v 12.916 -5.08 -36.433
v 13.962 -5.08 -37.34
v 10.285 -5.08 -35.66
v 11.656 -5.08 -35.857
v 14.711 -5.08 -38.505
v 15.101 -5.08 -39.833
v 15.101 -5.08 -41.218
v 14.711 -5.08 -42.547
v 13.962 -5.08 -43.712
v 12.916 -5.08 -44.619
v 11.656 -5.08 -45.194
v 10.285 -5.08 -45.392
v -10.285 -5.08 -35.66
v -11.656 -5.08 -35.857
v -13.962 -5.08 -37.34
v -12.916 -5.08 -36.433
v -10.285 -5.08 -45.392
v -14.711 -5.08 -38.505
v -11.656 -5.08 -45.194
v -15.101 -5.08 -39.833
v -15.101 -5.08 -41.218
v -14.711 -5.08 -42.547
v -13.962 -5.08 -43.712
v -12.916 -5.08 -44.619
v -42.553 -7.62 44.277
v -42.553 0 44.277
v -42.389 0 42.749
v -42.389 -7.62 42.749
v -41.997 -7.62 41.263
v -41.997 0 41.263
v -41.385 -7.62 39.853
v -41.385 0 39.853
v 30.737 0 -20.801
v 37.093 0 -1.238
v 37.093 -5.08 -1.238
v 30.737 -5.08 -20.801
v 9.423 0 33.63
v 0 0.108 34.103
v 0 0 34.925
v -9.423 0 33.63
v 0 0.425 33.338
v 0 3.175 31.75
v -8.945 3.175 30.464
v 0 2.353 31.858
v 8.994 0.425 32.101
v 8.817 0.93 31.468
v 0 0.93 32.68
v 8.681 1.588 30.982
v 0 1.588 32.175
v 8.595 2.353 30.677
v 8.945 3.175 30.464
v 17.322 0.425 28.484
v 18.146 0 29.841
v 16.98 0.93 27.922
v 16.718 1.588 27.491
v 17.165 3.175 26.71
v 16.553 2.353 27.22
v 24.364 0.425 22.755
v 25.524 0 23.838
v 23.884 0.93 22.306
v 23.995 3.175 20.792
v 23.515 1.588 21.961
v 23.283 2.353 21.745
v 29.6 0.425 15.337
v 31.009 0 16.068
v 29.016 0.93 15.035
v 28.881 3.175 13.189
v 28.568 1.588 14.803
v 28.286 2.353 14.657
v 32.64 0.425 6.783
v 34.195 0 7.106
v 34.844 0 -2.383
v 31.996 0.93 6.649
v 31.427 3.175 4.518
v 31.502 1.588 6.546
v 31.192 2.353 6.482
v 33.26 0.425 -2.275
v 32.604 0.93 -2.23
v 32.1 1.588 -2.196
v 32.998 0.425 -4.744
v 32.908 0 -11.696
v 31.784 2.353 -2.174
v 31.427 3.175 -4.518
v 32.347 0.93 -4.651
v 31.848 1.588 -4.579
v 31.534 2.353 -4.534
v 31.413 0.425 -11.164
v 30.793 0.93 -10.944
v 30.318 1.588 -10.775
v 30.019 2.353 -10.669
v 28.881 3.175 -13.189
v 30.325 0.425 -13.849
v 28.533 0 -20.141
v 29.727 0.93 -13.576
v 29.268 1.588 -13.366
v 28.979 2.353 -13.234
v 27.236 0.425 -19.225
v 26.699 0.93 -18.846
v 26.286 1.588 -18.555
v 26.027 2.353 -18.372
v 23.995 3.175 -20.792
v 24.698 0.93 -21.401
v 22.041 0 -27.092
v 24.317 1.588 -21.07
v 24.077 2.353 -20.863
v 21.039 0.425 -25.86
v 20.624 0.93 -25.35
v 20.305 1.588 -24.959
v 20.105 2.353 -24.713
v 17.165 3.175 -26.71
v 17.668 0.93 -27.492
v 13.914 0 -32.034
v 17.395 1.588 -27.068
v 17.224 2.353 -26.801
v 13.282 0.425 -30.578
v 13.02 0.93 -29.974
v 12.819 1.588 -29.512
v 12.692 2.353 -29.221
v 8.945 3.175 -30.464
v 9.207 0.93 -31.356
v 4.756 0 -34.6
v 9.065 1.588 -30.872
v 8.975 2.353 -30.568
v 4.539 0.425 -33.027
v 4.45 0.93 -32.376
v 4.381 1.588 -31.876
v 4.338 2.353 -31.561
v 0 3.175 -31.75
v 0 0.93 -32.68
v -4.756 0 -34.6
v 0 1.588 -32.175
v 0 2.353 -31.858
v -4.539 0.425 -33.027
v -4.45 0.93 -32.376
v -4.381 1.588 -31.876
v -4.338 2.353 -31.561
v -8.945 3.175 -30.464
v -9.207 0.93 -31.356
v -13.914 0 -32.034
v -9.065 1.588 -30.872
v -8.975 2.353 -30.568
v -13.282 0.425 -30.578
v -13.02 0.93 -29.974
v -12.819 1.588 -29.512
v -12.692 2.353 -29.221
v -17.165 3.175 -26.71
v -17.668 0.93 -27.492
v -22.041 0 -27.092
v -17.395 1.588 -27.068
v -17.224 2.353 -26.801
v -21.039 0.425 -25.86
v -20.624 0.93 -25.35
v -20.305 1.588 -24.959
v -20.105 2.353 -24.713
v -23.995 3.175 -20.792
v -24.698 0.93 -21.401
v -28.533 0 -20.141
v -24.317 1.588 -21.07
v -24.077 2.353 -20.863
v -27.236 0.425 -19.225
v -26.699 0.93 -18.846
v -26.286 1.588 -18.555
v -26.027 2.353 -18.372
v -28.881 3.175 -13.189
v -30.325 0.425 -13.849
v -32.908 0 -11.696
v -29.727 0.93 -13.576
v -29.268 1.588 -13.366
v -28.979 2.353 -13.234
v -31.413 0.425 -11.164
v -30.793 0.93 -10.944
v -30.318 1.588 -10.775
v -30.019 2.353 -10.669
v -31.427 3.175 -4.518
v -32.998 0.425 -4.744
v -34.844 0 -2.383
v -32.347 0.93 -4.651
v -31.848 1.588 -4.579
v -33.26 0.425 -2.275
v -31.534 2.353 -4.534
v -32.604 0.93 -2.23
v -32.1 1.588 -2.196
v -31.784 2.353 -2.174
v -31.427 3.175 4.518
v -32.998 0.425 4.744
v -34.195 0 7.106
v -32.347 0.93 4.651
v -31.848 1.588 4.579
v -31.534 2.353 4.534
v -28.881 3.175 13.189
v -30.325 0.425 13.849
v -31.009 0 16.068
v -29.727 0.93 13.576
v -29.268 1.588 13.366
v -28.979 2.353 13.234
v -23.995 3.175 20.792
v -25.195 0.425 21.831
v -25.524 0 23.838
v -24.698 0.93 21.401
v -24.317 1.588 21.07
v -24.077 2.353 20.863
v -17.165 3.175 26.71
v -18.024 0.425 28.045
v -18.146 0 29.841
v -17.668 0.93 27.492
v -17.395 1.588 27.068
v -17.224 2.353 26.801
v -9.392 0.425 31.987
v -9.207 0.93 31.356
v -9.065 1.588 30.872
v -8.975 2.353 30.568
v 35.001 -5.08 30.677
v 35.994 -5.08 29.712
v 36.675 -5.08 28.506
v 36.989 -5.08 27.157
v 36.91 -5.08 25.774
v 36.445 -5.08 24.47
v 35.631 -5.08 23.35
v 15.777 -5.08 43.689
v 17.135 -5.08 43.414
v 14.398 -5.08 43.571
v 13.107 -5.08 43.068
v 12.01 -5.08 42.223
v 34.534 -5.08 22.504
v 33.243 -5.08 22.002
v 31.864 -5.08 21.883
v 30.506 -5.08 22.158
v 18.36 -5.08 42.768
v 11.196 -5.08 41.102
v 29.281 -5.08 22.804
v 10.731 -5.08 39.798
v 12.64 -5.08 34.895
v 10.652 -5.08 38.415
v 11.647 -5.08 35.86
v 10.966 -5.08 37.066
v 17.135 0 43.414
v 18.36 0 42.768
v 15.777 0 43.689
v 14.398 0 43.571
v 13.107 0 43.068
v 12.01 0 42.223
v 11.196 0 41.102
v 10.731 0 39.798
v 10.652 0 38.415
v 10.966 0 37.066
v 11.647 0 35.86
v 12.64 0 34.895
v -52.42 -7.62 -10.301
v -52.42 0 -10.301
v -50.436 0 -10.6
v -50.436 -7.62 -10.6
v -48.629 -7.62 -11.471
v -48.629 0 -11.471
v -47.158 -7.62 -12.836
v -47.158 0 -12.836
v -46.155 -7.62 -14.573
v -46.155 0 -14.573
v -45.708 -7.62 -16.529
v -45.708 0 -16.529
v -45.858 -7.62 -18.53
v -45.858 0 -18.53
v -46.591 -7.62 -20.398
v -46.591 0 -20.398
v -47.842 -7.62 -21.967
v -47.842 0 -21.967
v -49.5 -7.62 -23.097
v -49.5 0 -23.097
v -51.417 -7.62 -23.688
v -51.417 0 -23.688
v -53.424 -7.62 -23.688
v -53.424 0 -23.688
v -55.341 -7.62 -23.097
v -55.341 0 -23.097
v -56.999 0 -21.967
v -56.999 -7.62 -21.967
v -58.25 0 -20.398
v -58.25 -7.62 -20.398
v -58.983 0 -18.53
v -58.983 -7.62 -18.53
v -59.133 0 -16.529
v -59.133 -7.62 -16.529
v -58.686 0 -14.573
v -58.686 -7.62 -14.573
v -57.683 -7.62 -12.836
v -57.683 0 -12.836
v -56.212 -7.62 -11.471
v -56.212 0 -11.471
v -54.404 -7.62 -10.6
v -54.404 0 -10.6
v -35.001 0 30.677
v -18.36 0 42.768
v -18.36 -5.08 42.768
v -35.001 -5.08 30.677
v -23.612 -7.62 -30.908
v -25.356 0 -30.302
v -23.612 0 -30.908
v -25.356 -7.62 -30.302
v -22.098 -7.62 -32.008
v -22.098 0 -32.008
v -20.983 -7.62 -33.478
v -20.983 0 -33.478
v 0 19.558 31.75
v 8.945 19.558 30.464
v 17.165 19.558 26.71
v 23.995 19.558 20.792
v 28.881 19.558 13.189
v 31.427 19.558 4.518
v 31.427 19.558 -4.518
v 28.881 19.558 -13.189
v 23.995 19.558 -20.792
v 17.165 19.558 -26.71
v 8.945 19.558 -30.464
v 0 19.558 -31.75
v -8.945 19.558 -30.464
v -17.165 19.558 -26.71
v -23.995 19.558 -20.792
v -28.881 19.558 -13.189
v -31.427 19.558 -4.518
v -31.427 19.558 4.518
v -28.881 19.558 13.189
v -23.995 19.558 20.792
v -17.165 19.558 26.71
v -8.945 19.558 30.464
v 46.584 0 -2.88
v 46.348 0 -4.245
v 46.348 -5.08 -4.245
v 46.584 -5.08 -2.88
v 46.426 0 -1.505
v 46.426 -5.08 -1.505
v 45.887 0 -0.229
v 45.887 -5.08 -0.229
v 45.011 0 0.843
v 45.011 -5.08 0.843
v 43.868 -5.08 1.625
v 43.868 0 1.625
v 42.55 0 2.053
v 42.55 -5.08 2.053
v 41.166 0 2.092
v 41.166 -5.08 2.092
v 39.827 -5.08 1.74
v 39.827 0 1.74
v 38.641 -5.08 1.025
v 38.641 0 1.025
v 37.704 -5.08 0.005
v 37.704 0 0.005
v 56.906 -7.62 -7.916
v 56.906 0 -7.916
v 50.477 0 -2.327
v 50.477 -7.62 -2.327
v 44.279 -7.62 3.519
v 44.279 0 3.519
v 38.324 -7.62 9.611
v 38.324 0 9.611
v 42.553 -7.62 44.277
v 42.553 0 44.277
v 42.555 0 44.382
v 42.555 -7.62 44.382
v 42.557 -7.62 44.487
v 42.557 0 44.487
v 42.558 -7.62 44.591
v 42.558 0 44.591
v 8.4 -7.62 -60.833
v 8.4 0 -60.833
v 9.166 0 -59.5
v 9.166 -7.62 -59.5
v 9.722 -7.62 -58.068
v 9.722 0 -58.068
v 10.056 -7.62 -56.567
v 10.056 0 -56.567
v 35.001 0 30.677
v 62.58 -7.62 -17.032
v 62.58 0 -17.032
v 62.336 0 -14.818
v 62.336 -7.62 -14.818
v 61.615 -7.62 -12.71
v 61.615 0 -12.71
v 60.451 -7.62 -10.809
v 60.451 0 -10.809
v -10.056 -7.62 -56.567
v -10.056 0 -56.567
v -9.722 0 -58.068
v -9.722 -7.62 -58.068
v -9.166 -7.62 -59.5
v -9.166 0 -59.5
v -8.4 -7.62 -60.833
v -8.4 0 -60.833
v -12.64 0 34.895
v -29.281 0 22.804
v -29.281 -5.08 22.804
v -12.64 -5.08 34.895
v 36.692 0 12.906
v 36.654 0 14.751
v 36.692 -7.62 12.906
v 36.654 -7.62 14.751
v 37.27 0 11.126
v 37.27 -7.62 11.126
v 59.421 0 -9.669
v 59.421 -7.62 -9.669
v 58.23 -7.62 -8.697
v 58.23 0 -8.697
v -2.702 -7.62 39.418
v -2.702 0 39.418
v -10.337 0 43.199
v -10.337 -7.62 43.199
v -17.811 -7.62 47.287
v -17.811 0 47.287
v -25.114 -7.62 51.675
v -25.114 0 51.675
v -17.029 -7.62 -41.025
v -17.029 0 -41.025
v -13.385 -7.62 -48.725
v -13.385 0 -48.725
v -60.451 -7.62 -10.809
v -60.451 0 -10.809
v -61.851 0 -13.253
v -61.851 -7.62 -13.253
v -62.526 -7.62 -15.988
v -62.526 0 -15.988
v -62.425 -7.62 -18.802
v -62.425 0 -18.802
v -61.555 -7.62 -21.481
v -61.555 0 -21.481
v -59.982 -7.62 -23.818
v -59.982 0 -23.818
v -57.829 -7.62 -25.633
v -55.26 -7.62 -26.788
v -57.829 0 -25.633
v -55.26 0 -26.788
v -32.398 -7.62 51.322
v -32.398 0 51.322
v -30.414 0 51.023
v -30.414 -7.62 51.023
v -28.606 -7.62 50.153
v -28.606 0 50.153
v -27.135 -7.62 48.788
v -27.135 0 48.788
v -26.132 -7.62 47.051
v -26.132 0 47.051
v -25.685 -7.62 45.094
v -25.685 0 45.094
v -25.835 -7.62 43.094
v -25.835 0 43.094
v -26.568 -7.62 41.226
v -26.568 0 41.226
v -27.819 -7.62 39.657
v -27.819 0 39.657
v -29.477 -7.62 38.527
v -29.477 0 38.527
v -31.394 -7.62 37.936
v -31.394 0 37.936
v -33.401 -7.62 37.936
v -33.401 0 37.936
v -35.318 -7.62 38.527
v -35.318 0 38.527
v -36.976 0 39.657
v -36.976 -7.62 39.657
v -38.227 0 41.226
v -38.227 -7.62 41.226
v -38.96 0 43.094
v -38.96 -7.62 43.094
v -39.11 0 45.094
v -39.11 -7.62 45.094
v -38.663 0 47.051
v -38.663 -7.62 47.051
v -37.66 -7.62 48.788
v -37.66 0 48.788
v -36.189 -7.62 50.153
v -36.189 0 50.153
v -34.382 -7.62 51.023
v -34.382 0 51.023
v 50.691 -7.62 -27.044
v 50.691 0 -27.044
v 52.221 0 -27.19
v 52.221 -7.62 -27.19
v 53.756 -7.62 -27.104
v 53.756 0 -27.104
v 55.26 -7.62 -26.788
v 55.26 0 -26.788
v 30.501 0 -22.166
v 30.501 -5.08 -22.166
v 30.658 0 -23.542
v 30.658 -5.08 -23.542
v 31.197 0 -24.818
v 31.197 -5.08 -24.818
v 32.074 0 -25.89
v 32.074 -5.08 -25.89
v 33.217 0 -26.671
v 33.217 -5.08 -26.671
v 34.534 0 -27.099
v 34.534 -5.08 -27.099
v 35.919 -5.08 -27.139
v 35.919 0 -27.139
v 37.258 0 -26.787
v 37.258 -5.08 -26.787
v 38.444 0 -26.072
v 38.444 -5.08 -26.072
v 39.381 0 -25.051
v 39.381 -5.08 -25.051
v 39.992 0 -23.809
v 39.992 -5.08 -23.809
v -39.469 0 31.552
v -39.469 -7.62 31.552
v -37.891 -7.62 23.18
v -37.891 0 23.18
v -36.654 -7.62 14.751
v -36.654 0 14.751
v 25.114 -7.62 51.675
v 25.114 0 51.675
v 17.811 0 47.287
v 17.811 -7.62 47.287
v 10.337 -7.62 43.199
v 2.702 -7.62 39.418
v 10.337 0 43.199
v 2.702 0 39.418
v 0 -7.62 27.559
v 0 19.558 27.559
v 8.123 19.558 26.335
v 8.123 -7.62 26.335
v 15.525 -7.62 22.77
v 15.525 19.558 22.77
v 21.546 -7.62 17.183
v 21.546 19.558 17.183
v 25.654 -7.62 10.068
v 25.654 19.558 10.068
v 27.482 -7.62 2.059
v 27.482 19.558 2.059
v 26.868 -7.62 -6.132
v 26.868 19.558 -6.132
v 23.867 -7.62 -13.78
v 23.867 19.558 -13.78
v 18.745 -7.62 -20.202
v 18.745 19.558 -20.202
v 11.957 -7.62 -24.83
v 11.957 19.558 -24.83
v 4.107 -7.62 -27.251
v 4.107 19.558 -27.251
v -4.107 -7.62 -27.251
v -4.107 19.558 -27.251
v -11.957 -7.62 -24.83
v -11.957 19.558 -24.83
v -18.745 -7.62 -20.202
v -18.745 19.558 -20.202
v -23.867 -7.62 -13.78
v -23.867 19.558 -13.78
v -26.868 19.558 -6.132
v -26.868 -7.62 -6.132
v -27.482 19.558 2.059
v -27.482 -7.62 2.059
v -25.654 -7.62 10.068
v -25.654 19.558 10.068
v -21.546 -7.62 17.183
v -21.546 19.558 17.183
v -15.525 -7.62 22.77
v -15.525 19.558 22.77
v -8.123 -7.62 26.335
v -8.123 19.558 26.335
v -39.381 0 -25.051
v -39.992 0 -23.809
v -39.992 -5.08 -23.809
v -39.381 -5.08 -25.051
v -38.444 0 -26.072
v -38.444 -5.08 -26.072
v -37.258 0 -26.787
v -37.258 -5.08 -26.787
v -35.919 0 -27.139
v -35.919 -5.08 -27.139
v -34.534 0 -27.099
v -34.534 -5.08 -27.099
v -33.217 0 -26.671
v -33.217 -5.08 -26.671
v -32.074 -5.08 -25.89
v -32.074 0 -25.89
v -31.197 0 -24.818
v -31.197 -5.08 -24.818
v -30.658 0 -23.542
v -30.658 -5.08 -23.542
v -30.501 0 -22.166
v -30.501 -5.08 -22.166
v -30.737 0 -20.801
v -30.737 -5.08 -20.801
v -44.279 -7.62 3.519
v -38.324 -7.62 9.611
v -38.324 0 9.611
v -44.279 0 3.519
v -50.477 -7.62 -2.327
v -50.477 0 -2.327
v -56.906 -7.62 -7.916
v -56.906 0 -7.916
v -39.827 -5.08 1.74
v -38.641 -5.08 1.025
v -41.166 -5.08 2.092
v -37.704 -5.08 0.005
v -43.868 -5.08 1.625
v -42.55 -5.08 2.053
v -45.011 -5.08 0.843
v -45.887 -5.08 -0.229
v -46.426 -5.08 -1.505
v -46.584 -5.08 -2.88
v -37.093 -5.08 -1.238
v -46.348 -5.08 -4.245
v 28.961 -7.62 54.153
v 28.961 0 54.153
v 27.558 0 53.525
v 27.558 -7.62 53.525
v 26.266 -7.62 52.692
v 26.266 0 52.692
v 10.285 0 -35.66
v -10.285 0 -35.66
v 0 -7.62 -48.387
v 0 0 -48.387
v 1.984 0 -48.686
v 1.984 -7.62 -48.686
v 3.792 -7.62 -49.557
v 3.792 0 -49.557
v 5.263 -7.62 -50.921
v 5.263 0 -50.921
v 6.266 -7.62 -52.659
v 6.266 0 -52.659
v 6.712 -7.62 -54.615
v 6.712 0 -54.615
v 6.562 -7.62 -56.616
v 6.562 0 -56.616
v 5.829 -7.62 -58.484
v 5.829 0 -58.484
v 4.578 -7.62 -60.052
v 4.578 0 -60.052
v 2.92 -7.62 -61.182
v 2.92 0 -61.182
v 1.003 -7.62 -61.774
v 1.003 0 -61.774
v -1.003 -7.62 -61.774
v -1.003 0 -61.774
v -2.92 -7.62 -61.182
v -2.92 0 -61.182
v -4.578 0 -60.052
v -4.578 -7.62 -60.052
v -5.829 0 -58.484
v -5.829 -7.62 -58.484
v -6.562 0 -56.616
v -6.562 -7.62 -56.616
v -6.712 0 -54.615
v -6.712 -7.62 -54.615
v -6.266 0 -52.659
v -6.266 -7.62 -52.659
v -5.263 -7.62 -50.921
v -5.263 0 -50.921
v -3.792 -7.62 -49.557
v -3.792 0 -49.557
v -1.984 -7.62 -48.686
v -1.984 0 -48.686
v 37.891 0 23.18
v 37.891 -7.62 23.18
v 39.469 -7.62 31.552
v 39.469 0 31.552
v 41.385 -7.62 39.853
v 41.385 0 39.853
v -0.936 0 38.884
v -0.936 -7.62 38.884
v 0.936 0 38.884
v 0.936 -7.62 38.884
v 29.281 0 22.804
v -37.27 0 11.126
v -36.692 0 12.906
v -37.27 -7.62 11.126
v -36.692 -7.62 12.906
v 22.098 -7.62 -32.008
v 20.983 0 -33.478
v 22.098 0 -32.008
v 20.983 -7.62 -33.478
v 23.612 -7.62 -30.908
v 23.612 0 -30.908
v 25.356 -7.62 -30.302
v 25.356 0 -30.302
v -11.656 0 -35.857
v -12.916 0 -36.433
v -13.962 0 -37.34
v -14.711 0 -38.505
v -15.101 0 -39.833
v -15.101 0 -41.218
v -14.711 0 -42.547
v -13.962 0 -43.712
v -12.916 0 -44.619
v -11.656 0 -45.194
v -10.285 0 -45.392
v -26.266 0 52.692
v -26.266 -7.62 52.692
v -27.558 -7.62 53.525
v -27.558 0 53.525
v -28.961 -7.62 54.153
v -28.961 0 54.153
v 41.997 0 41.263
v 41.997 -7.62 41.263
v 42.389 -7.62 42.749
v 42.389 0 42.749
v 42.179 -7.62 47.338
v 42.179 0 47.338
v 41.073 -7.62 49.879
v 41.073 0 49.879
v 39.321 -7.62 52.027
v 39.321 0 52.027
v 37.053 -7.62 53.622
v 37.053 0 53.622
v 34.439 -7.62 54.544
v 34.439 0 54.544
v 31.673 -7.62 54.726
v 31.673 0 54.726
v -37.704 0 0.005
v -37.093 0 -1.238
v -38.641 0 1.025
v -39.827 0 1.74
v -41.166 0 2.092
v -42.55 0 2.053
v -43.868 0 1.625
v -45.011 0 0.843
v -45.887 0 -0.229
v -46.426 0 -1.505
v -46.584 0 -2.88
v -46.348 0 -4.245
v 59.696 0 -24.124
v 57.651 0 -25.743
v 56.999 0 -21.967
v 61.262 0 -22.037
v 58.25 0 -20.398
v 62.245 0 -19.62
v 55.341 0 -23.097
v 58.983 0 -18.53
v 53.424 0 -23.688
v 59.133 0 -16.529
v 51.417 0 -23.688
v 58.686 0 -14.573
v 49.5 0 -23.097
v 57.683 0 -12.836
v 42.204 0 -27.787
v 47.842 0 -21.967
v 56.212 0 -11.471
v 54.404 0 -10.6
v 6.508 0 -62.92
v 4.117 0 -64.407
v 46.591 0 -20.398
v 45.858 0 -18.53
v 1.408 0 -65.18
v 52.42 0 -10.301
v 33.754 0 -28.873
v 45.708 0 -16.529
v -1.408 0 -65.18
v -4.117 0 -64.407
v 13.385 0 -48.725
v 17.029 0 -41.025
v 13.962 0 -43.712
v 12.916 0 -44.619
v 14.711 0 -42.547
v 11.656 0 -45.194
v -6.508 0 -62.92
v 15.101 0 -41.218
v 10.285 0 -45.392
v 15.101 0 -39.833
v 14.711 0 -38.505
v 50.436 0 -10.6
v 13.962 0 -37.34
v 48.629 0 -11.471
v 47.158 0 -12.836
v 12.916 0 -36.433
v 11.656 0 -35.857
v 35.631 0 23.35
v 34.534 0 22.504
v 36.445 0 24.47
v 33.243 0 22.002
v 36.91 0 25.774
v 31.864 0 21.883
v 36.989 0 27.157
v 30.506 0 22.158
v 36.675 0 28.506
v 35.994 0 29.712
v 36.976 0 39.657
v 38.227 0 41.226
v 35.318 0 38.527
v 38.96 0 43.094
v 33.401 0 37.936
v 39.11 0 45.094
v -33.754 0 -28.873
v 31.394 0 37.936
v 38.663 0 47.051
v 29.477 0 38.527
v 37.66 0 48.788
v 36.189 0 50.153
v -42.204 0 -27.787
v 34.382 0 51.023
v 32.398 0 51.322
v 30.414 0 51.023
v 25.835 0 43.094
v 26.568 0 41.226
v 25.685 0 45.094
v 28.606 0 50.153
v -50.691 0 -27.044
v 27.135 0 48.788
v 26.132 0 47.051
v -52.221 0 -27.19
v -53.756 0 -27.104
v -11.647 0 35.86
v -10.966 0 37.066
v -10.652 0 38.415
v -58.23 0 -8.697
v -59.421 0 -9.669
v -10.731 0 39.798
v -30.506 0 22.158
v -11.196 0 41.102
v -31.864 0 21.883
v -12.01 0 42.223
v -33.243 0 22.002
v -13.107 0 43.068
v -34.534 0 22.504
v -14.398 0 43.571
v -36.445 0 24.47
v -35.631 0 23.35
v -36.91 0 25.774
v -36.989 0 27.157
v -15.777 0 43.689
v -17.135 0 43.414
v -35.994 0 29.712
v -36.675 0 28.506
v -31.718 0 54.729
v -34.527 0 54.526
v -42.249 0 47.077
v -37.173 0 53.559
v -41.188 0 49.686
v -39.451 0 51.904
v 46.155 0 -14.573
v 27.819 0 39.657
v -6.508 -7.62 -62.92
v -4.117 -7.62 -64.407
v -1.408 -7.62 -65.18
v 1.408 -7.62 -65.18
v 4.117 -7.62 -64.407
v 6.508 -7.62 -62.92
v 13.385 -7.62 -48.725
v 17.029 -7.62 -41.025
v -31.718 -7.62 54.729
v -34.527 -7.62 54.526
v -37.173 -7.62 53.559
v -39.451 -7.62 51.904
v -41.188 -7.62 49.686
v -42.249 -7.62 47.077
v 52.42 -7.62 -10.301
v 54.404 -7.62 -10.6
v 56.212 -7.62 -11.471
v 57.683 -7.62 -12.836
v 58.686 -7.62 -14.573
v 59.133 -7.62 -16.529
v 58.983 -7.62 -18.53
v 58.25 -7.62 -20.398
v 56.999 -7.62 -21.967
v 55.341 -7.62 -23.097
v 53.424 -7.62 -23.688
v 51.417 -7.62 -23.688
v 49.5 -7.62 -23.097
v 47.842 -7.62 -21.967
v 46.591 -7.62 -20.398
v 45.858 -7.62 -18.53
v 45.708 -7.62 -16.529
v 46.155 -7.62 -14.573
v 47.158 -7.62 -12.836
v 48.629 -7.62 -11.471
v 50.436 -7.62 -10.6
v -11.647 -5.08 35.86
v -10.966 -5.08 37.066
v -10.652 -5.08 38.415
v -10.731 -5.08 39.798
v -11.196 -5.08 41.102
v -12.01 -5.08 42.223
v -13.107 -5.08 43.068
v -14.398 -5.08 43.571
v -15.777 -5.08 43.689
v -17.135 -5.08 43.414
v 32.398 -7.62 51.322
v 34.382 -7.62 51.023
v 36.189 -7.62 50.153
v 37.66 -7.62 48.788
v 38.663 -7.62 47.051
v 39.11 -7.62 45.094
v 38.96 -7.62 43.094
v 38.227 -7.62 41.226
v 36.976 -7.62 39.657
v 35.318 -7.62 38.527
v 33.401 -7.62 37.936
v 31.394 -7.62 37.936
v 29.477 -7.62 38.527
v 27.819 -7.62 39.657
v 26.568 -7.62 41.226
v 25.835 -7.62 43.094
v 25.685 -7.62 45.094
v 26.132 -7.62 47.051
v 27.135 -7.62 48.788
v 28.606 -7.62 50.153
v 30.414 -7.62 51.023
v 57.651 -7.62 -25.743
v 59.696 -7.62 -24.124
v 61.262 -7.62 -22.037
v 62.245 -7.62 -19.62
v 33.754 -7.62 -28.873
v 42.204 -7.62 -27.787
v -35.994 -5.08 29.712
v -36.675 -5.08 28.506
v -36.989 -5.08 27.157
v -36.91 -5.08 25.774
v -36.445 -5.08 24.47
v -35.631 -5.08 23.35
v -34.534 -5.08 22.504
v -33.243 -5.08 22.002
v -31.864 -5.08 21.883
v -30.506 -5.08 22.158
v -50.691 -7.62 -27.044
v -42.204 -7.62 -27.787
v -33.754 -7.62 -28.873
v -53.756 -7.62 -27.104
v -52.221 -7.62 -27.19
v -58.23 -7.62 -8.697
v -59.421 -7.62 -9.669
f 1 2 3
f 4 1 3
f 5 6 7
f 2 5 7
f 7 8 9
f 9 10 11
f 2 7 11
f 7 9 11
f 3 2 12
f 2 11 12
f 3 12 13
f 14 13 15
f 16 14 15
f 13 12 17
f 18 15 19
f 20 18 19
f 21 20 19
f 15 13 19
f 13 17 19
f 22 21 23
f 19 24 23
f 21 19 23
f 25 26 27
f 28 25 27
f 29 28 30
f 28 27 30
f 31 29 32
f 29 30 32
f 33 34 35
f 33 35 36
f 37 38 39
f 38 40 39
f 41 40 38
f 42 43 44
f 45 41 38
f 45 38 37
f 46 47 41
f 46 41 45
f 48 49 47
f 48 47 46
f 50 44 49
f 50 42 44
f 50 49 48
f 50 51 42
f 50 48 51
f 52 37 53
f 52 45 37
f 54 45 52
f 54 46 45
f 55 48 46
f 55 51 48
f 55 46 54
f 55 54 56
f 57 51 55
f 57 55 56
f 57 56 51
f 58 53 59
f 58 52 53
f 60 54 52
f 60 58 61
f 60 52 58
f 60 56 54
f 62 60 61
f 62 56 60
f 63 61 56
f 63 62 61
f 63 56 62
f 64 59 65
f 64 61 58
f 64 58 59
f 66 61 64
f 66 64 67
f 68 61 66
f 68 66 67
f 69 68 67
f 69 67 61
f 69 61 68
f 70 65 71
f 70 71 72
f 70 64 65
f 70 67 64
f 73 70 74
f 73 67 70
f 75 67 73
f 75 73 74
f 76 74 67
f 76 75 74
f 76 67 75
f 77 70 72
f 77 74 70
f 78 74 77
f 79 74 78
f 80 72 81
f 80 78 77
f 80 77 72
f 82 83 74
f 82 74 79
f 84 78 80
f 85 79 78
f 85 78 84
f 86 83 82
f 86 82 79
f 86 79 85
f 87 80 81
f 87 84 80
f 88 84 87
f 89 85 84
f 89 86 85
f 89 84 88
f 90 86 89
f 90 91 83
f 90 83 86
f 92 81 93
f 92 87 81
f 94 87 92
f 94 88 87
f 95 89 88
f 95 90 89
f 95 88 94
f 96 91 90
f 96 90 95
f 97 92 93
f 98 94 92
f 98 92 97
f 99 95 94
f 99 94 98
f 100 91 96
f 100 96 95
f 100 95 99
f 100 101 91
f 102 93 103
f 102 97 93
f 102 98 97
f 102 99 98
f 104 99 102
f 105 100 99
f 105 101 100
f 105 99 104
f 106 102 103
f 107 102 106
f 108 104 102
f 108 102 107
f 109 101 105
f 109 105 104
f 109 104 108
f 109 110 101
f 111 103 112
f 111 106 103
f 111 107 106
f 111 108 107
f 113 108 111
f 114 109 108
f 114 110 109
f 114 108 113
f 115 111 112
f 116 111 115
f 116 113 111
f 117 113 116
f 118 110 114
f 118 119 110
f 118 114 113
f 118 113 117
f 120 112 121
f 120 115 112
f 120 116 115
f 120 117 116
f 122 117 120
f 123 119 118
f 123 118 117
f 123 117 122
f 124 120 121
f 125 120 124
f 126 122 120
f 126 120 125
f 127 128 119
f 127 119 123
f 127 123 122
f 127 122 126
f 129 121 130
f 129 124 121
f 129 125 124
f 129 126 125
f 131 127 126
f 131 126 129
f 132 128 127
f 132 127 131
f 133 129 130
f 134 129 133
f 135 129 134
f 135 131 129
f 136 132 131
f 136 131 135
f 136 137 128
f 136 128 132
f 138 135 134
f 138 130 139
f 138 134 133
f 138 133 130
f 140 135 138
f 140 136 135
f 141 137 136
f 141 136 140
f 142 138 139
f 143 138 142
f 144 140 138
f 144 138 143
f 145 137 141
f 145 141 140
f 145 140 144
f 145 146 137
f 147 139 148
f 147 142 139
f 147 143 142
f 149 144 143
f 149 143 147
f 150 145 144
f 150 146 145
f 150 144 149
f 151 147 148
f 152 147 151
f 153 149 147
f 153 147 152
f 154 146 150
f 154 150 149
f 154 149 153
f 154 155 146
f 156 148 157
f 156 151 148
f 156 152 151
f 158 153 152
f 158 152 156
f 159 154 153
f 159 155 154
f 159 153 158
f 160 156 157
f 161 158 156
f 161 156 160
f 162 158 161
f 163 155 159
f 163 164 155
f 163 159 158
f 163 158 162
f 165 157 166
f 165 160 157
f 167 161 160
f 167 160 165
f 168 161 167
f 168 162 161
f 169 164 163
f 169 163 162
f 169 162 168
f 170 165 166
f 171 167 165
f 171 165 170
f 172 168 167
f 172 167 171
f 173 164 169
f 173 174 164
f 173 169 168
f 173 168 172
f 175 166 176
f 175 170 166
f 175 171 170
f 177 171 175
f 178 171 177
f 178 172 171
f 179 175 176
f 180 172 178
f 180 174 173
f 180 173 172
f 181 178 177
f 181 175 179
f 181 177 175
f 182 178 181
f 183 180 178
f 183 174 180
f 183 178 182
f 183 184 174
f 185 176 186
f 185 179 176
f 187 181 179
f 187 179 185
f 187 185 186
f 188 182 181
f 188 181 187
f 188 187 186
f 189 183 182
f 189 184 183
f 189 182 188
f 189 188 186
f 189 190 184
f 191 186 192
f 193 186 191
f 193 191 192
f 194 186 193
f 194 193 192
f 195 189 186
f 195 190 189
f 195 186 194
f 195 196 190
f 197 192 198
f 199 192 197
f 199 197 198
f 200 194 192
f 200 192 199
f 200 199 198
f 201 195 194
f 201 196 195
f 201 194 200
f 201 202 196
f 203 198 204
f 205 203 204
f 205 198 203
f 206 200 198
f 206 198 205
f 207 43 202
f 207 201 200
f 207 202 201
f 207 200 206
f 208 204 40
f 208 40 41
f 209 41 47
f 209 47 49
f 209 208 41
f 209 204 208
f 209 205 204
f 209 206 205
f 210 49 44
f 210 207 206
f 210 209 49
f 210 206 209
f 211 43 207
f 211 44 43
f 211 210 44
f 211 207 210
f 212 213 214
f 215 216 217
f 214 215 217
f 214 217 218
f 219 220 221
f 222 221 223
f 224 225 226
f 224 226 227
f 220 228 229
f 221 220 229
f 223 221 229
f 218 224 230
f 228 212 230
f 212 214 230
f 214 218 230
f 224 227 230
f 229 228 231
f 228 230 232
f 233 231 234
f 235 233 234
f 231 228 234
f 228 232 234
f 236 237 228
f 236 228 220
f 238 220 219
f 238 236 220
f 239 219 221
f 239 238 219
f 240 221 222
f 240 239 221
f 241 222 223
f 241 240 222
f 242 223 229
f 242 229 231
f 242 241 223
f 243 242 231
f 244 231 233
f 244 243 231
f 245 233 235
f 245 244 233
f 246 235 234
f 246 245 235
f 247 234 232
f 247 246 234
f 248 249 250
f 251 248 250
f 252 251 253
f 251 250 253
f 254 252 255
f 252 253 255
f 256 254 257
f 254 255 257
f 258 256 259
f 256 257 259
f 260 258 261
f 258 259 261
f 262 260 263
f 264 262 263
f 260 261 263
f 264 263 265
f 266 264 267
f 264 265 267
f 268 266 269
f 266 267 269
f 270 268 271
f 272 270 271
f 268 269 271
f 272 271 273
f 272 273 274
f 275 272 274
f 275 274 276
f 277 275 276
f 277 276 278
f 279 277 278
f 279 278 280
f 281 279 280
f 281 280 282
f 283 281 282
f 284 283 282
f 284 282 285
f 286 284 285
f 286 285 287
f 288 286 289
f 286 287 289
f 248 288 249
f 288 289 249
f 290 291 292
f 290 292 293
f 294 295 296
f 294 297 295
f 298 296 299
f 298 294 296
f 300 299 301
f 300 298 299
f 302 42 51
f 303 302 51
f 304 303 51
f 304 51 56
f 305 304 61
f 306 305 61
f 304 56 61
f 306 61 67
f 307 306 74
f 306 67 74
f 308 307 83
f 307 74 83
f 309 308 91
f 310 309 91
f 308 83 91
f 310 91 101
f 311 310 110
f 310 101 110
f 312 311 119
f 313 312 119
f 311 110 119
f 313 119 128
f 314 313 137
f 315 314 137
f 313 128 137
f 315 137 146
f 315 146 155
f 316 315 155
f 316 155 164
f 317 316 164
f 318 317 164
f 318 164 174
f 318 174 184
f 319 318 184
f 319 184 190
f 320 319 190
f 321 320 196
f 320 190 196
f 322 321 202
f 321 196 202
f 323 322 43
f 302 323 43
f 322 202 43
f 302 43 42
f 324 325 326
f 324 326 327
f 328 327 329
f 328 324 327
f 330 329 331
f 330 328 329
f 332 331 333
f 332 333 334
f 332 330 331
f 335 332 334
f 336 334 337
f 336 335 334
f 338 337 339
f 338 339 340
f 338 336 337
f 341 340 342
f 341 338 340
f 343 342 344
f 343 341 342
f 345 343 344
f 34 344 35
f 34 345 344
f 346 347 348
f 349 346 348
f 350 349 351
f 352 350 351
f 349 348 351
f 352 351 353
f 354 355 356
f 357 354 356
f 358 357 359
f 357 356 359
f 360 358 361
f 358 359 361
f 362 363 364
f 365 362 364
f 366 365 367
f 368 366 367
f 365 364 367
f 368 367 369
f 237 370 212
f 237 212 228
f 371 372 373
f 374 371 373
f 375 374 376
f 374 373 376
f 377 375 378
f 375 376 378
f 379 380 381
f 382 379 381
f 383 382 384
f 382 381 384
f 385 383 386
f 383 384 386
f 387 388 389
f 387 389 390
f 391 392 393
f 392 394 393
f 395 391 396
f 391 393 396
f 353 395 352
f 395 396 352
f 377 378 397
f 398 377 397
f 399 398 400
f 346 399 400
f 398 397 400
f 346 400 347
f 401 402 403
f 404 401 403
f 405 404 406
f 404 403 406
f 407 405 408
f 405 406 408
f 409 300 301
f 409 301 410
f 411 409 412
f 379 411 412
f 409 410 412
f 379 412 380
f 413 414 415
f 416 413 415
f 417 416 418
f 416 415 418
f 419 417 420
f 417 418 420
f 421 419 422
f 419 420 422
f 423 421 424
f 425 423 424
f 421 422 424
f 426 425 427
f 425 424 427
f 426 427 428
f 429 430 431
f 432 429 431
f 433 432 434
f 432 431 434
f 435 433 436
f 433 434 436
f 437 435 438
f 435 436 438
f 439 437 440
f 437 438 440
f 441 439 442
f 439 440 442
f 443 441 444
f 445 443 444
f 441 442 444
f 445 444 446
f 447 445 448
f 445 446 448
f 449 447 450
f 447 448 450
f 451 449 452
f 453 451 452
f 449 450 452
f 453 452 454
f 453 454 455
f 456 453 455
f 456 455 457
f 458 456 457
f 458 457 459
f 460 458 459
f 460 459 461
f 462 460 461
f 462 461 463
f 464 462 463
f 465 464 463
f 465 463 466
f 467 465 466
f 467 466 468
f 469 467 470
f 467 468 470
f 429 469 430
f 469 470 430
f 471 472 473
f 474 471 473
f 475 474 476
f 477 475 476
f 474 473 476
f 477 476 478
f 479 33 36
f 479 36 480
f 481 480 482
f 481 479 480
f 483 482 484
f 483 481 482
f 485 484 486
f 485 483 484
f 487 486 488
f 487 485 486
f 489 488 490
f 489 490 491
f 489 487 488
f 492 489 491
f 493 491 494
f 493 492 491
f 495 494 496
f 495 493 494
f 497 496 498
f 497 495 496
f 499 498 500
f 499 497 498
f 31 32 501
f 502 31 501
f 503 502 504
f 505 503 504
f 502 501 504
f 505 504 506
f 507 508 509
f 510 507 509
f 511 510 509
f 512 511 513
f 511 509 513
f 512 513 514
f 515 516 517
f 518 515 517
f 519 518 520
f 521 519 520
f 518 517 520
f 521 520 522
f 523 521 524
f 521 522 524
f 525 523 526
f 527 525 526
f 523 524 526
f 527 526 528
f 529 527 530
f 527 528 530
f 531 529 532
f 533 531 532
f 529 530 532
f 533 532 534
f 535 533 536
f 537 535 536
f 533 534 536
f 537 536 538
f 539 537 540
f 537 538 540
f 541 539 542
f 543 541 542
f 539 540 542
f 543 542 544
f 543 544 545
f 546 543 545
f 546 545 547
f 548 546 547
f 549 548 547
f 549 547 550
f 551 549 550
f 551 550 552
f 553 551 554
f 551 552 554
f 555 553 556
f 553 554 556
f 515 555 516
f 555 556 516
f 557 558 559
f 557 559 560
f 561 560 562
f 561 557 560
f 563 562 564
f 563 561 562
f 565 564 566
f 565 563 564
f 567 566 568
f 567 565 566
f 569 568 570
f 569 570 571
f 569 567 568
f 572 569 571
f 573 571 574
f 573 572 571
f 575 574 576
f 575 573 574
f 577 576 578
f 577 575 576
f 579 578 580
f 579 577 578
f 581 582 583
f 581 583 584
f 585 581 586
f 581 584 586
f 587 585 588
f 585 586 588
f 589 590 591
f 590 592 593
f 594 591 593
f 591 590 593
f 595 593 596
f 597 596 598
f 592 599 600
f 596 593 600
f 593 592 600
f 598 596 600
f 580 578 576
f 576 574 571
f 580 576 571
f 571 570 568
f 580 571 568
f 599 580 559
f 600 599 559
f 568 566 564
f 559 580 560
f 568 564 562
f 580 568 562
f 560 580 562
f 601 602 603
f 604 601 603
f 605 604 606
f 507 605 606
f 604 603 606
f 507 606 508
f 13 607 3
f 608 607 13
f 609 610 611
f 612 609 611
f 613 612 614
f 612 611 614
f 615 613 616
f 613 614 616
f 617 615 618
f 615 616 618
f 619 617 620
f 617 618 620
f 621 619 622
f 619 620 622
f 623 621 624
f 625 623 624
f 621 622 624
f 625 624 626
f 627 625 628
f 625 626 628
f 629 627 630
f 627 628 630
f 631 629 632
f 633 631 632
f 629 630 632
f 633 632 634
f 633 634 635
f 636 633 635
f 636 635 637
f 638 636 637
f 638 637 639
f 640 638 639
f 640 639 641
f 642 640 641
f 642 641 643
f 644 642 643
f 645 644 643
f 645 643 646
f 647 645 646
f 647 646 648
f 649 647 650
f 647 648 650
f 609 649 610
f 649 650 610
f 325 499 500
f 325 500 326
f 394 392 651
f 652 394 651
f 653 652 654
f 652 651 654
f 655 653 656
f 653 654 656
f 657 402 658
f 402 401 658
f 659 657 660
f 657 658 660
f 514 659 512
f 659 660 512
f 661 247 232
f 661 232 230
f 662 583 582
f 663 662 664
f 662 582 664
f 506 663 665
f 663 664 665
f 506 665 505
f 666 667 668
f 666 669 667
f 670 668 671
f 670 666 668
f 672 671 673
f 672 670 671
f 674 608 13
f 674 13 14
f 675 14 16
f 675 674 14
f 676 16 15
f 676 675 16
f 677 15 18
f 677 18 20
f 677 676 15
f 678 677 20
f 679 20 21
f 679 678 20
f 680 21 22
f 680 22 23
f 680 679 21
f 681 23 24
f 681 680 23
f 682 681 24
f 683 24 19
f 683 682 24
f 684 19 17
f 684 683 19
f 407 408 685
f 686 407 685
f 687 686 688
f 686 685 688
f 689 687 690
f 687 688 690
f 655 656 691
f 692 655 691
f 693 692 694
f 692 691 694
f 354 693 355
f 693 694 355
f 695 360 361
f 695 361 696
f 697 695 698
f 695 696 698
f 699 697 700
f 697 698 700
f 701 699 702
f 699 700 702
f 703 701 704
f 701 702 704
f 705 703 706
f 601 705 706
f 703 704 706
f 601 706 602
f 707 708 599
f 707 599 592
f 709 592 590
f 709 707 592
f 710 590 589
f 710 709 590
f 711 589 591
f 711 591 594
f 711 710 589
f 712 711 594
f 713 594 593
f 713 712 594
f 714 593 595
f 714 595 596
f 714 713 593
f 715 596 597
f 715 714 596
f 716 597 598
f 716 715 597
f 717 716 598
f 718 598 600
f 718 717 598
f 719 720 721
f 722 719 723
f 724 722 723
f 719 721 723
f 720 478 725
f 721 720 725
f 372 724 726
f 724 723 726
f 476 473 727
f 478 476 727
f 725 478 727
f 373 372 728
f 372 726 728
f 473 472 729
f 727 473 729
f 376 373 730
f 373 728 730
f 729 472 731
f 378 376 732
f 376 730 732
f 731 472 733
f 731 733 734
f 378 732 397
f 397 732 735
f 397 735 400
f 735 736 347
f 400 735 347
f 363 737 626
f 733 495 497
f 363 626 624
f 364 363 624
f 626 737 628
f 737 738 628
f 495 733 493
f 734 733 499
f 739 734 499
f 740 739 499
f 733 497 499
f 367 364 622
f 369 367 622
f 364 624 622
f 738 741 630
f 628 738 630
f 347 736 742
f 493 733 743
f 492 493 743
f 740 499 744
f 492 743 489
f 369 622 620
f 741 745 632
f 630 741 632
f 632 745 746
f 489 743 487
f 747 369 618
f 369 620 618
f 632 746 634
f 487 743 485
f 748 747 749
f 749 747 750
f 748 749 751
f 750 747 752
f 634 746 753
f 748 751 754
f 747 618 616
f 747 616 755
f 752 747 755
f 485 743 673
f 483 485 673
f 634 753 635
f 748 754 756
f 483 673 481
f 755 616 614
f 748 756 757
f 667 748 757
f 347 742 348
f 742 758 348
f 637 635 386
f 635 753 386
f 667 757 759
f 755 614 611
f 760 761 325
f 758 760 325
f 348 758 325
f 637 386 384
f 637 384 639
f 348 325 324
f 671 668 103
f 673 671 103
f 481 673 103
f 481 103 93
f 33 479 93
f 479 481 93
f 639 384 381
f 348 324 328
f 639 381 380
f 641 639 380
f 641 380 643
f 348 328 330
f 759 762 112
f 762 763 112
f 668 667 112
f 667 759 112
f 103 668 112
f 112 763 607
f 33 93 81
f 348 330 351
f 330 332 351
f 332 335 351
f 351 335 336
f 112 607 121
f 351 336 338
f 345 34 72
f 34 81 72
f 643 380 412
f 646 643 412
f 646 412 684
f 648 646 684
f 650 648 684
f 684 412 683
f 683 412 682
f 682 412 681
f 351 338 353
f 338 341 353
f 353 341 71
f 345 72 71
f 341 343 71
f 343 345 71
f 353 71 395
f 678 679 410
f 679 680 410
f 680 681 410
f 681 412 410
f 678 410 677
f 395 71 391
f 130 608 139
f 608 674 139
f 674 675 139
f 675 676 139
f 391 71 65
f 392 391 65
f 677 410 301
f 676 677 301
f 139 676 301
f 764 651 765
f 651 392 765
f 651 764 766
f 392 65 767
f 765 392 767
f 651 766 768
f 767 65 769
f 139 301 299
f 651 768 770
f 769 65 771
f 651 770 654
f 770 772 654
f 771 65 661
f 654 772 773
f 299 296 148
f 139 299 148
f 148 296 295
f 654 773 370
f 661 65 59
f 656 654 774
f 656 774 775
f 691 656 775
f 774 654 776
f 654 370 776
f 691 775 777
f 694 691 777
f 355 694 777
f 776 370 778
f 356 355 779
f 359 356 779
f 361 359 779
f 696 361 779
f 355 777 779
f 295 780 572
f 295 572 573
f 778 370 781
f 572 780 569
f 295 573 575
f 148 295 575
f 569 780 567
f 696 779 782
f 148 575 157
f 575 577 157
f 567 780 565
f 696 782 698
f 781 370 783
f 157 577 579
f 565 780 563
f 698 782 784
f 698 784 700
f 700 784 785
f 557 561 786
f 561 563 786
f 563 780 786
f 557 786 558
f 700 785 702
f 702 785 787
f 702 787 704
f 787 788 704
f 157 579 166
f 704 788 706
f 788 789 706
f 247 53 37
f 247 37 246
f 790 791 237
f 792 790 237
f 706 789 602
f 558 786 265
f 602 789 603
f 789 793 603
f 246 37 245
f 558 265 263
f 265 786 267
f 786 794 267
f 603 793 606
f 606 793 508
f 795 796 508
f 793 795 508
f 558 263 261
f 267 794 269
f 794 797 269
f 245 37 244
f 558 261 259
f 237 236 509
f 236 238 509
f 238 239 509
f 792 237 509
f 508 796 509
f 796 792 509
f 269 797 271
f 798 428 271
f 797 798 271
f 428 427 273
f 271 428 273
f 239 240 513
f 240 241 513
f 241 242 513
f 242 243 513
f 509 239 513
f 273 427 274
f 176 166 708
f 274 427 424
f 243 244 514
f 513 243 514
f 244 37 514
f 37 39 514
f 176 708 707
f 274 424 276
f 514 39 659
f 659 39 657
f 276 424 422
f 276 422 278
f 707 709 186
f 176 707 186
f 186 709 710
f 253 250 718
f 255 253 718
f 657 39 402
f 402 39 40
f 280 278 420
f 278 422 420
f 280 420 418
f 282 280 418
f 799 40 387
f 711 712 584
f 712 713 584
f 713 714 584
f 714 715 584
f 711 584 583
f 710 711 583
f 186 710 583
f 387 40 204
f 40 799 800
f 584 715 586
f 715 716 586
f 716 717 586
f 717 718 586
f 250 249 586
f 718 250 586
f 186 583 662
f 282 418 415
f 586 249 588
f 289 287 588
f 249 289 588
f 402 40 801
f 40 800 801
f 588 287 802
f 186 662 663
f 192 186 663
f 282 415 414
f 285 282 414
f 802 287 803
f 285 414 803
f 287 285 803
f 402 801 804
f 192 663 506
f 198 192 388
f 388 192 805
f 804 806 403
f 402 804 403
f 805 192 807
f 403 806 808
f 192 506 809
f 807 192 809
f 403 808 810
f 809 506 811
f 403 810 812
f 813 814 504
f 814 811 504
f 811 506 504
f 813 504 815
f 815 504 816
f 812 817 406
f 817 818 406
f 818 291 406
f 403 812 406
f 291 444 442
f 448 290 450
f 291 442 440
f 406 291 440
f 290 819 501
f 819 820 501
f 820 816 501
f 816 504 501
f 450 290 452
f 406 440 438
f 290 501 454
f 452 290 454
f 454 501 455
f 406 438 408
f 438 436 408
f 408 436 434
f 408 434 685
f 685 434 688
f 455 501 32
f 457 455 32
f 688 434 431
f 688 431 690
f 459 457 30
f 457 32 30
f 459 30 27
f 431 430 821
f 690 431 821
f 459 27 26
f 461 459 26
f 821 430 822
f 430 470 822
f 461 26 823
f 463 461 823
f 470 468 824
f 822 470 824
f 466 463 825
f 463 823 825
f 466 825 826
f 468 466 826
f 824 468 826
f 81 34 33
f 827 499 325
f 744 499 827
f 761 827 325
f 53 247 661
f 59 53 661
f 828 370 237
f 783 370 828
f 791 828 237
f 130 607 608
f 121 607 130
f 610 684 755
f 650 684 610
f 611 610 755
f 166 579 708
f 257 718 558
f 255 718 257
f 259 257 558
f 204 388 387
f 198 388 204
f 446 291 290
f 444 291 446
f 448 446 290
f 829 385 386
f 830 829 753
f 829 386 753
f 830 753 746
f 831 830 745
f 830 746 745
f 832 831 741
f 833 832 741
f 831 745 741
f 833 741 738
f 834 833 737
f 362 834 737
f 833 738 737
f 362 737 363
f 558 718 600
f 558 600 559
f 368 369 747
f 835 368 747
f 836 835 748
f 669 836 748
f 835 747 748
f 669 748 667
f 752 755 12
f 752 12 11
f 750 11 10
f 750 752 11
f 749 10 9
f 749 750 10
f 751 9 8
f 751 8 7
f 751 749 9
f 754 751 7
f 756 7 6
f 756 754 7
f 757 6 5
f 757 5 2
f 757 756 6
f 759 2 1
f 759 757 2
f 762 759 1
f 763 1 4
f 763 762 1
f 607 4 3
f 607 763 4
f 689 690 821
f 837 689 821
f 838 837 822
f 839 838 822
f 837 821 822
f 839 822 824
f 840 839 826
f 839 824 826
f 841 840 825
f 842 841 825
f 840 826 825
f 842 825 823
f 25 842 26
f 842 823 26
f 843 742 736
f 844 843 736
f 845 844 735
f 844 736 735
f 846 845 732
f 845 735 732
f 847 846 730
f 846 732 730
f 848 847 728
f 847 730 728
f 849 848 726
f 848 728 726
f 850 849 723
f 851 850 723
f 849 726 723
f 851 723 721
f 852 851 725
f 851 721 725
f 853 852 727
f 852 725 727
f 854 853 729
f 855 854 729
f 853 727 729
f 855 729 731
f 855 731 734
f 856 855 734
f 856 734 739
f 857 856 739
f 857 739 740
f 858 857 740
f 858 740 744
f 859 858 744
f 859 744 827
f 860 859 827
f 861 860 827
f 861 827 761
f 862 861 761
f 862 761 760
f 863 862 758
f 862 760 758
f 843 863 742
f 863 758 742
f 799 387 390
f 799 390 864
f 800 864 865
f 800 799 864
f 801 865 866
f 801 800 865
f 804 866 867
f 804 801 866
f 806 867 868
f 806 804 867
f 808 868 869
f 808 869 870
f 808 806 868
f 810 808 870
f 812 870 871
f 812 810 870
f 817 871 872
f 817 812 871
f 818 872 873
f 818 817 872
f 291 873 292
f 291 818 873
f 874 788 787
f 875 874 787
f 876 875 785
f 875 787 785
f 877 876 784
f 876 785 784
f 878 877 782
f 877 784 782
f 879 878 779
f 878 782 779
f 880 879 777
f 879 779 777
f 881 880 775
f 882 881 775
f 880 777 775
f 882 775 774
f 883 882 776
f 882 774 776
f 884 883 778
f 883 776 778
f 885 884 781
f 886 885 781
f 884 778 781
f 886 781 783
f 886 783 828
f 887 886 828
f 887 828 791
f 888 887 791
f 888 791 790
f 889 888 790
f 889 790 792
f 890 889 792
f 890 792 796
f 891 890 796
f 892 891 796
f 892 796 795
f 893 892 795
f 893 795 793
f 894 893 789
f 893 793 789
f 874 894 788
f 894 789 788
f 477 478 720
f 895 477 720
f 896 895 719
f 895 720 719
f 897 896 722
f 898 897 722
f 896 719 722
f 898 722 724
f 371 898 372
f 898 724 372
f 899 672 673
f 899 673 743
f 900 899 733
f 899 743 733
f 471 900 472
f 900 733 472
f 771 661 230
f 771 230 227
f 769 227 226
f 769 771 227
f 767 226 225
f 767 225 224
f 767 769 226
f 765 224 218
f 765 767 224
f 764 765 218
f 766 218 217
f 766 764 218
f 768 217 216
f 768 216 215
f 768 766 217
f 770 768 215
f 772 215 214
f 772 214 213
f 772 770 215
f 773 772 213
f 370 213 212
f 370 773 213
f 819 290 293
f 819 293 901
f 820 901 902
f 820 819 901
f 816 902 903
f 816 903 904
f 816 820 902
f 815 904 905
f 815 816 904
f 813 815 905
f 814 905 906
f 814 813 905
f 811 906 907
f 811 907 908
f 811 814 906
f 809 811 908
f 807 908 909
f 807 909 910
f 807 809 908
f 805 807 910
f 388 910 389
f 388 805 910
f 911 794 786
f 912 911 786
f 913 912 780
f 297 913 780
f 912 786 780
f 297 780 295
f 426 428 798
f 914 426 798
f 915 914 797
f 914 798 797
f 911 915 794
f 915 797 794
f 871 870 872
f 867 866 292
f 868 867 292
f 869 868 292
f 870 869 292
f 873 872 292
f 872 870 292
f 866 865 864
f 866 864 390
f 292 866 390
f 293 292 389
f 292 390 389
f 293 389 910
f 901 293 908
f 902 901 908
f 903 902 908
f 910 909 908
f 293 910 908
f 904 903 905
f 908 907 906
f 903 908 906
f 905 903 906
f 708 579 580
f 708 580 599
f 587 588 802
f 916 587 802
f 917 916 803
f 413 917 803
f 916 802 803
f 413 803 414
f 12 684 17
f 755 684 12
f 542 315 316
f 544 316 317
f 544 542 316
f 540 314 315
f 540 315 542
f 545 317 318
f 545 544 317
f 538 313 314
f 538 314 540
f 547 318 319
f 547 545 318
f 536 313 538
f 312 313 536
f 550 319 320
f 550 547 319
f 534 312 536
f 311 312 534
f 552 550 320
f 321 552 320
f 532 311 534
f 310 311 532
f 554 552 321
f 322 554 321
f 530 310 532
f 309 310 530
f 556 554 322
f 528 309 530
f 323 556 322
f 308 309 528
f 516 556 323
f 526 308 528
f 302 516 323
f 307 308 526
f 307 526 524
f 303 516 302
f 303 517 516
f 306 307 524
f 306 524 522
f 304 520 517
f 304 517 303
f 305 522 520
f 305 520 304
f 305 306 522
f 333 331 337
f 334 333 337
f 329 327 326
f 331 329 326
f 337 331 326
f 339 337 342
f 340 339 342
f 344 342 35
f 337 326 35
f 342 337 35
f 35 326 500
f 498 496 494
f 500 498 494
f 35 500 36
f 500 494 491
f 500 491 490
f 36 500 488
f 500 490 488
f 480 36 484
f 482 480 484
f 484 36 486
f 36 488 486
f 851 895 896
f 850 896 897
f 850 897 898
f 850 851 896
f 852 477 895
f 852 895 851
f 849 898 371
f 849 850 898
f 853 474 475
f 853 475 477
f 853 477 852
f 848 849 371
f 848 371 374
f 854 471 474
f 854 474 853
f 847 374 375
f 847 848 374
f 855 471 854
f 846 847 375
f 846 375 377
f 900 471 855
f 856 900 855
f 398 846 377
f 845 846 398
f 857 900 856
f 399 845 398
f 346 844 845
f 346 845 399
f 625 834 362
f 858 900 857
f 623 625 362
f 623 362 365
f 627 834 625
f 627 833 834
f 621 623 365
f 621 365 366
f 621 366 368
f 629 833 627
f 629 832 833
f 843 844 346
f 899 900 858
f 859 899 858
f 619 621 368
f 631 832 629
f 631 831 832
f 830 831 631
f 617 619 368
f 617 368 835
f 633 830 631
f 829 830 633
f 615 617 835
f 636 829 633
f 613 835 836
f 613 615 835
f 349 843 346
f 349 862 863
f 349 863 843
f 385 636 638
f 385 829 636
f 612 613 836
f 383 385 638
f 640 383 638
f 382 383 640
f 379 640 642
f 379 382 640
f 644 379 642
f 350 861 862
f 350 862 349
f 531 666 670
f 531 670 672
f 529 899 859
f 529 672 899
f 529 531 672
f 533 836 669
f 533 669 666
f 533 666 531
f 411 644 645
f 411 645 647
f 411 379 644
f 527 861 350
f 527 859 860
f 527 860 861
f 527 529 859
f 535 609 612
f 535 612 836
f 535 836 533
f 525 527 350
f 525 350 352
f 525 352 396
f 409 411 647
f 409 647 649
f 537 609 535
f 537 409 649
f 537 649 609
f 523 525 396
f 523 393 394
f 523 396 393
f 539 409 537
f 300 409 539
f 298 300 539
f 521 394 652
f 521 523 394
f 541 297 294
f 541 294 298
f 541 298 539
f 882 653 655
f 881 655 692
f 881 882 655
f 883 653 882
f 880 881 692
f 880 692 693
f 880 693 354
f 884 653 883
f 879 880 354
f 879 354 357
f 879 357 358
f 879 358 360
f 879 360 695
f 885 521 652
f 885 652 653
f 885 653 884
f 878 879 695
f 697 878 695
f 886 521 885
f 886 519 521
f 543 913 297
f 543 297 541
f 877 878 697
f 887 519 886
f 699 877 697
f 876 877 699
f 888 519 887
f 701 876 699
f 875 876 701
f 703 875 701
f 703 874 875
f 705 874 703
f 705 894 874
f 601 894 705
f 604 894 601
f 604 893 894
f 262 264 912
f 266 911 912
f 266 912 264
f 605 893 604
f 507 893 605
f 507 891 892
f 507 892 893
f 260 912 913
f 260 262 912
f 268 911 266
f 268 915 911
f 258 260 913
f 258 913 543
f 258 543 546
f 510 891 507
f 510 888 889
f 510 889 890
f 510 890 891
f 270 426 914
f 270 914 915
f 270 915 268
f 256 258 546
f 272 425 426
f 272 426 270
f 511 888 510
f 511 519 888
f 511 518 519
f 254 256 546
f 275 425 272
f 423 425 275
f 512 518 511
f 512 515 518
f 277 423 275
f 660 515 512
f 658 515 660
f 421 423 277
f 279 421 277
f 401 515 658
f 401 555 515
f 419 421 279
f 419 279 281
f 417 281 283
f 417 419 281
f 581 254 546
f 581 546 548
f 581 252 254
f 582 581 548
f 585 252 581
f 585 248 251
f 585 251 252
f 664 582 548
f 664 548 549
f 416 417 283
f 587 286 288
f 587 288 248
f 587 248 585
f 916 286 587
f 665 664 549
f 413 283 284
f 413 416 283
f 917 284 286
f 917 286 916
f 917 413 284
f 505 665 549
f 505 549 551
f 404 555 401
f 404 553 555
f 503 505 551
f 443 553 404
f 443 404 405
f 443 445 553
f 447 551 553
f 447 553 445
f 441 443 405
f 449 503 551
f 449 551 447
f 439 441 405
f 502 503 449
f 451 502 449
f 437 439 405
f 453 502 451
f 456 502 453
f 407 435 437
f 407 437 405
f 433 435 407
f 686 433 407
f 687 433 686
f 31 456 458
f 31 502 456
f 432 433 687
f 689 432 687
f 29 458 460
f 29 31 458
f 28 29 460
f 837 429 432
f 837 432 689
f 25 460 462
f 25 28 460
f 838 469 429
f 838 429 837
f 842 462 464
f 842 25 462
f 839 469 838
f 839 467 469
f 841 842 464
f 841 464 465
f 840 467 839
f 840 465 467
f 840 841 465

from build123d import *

# Parameters (mm, degrees)
SKETCH1_R                 = 31.75
CENTERCIRCLEEXTRUDE_DEPTH = 19.558
SKETCH2_R                 = 80.01
BASEEXPAND_DEPTH          = 7.62
FILLET15_R                = 3.175
SKETCH3_R                 = 27.559
CENTERCUT_DEPTH           = 27.178
SKETCH4_R                 = 6.731
OUTERCIRCLECUT_DEPTH      = 7.62
SKETCH8_R                 = 80.01
STARFISHCUT_DEPTH         = 7.62
BATMAN_CUT_DEPTH          = 5.08
FILLET12_R                = 6.35


with BuildPart() as part:
    # Sketch1 → CenterCircleExtrude (new body)
    with BuildSketch(Plane(origin=(0, 0, 0), x_dir=(1, 0, 0), z_dir=(0, 1, 0))):
        Circle(SKETCH1_R)
    extrude(amount=CENTERCIRCLEEXTRUDE_DEPTH)

    # Sketch2 → BaseExpand (add)
    with BuildSketch(Plane.XZ):
        Circle(SKETCH2_R)
    extrude(amount=BASEEXPAND_DEPTH)

    # Fillet15
    fillet15_edges = [part.edges().sort_by_distance(p)[0] for p in [
        (-31.75, 0, 0),
    ]]
    fillet(fillet15_edges, radius=FILLET15_R)

    # Sketch3 → CenterCut (cut)
    with BuildSketch(Plane(origin=(0, 19.558, 0), x_dir=(1, 0, 0), z_dir=(0, 1, 0))):
        Circle(SKETCH3_R)
    extrude(amount=-CENTERCUT_DEPTH, mode=Mode.SUBTRACT)

    # Sketch4 → OuterCircleCut (cut)
    with BuildSketch(Plane(origin=(0, 0, 0), x_dir=(1, 0, 0), z_dir=(0, 1, 0))):
        with Locations((0, 55.118)):
            Circle(SKETCH4_R)
        with Locations((52.420333065, 17.032398696)):
            Circle(SKETCH4_R)
        with Locations((32.397547536, -44.591398696)):
            Circle(SKETCH4_R)
        with Locations((-32.397547536, -44.591398696)):
            Circle(SKETCH4_R)
        with Locations((-52.420333065, 17.032398696)):
            Circle(SKETCH4_R)
    extrude(amount=-OUTERCIRCLECUT_DEPTH, mode=Mode.SUBTRACT)

    # Sketch8 → StarfishCut (cut)
    with BuildSketch(Plane(origin=(0, 0, 0), x_dir=(1, 0, 0), z_dir=(0, 1, 0))):
        Circle(SKETCH8_R)
        with BuildLine():
            ThreePointArc((-60.451485692, 10.809361858), (-62.083067271, 20.172011359), (-55.259862746, 26.787534327))
            ThreePointArc((-55.259862746, 26.787534327), (-52.990125634, 27.176408575), (-50.691117004, 27.044162367))
            ThreePointArc((-50.691117004, 27.044162367), (-36.498445494, 28.482280038), (-22.436174146, 30.88074446))
            ThreePointArc((-22.436174146, 30.88074446), (-15.809618103, 43.513592992), (-10.056110229, 56.567222915))
            ThreePointArc((-10.056110229, 56.567222915), (-9.47145111, 58.794576379), (-8.400222382, 60.833055899))
            ThreePointArc((-8.400222382, 60.833055899), (0, 65.278), (8.400222382, 60.833055899))
            ThreePointArc((8.400222382, 60.833055899), (9.47145111, 58.794576379), (10.056110229, 56.567222915))
            ThreePointArc((10.056110229, 56.567222915), (15.809618103, 43.513592992), (22.436174146, 30.88074446))
            ThreePointArc((22.436174146, 30.88074446), (36.498445494, 28.482280038), (50.691117004, 27.044162367))
            ThreePointArc((50.691117004, 27.044162367), (52.990125634, 27.176408575), (55.259862746, 26.787534327))
            ThreePointArc((55.259862746, 26.787534327), (60.546685924, 23.130594267), (62.580333065, 17.032398696))
            ThreePointArc((62.580333065, 17.032398696), (62.033399971, 13.743851196), (60.451485692, 10.809361858))
            ThreePointArc((60.451485692, 10.809361858), (58.843804343, 9.160637981), (56.90613492, 7.916304043))
            ThreePointArc((56.90613492, 7.916304043), (46.26932683, -1.589400596), (36.302492346, -11.795394786))
            ThreePointArc((36.302492346, -11.795394786), (38.366897955, -25.910575851), (41.384943465, -39.853011375))
            ThreePointArc((41.384943465, -39.853011375), (42.22114982, -41.998632188), (42.552695773, -44.27744921))
            ThreePointArc((42.552695773, -44.27744921), (42.556334523, -44.434405209), (42.557547536, -44.591398696))
            ThreePointArc((42.557547536, -44.591398696), (38.241722309, -52.902308467), (28.960850446, -54.152502874))
            ThreePointArc((28.960850446, -54.152502874), (26.896020001, -53.132990748), (25.11381532, -51.674677951))
            ThreePointArc((25.11381532, -51.674677951), (12.786398515, -44.495896582), (0, -38.170699348))
            ThreePointArc((0, -38.170699348), (-12.786398515, -44.495896582), (-25.11381532, -51.674677951))
            ThreePointArc((-25.11381532, -51.674677951), (-26.896020001, -53.132990748), (-28.960850446, -54.152502874))
            ThreePointArc((-28.960850446, -54.152502874), (-38.369445699, -52.811011359), (-42.552695773, -44.27744921))
            ThreePointArc((-42.552695773, -44.27744921), (-42.22114982, -41.998632188), (-41.384943465, -39.853011375))
            ThreePointArc((-41.384943465, -39.853011375), (-38.366897955, -25.910575851), (-36.302492346, -11.795394786))
            ThreePointArc((-36.302492346, -11.795394786), (-46.26932683, -1.589400596), (-56.90613492, 7.916304043))
            ThreePointArc((-56.90613492, 7.916304043), (-58.843804343, 9.160637981), (-60.451485692, 10.809361858))
        make_face(mode=Mode.SUBTRACT)
    extrude(amount=-STARFISHCUT_DEPTH, mode=Mode.SUBTRACT)

    # Sketch14 → Batman Cut (cut)
    with BuildSketch(Plane(origin=(0, 0, 0), x_dir=(1, 0, 0), z_dir=(0, 1, 0))):
        with BuildLine():
            Line((-29.28146985, -22.804327102), (-12.639732086, -34.895257327))
            ThreePointArc((-12.639732086, -34.895257327), (-11.563303962, -41.691557027), (-18.359603662, -42.767985152))
            Line((-18.359603662, -42.767985152), (-35.001341426, -30.677054926))
            ThreePointArc((-35.001341426, -30.677054926), (-36.07776955, -23.880755226), (-29.28146985, -22.804327102))
        make_face()
        with BuildLine():
            Line((-30.736675694, 20.801408088), (-37.093253888, 1.237872028))
            ThreePointArc((-37.093253888, 1.237872028), (-43.224284421, -1.88604406), (-46.348200509, 4.244986472))
            Line((-46.348200509, 4.244986472), (-39.991622315, 23.808522532))
            ThreePointArc((-39.991622315, 23.808522532), (-33.860591782, 26.93243862), (-30.736675694, 20.801408088))
        make_face()
        with BuildLine():
            Line((10.28515957, 35.660304314), (-10.28515957, 35.660304314))
            ThreePointArc((-10.28515957, 35.660304314), (-15.150772949, 40.525917694), (-10.28515957, 45.391531073))
            Line((-10.28515957, 45.391531073), (10.28515957, 45.391531073))
            ThreePointArc((10.28515957, 45.391531073), (15.150772949, 40.525917694), (10.28515957, 35.660304314))
        make_face()
        with BuildLine():
            Line((37.093253888, 1.237872028), (30.736675694, 20.801408088))
            ThreePointArc((30.736675694, 20.801408088), (33.860591782, 26.93243862), (39.991622315, 23.808522532))
            Line((39.991622315, 23.808522532), (46.348200509, 4.244986472))
            ThreePointArc((46.348200509, 4.244986472), (43.224284421, -1.88604406), (37.093253888, 1.237872028))
        make_face()
        with BuildLine():
            Line((12.639732086, -34.895257327), (29.28146985, -22.804327102))
            ThreePointArc((29.28146985, -22.804327102), (36.07776955, -23.880755226), (35.001341426, -30.677054926))
            Line((35.001341426, -30.677054926), (18.359603662, -42.767985152))
            ThreePointArc((18.359603662, -42.767985152), (11.563303962, -41.691557027), (12.639732086, -34.895257327))
        make_face()
    extrude(amount=-BATMAN_CUT_DEPTH, mode=Mode.SUBTRACT)

    # Fillet12
    fillet12_edges = [part.edges().sort_by_distance(p)[0] for p in [
        (-36.302492346, -3.81, 11.795394786),
        (0, -3.81, 38.170699348),
        (36.302492346, -3.81, 11.795394786),
        (22.436174146, -3.81, -30.88074446),
        (-22.436174146, -3.81, -30.88074446),
    ]]
    fillet(fillet12_edges, radius=FILLET12_R)


solid = part.part
